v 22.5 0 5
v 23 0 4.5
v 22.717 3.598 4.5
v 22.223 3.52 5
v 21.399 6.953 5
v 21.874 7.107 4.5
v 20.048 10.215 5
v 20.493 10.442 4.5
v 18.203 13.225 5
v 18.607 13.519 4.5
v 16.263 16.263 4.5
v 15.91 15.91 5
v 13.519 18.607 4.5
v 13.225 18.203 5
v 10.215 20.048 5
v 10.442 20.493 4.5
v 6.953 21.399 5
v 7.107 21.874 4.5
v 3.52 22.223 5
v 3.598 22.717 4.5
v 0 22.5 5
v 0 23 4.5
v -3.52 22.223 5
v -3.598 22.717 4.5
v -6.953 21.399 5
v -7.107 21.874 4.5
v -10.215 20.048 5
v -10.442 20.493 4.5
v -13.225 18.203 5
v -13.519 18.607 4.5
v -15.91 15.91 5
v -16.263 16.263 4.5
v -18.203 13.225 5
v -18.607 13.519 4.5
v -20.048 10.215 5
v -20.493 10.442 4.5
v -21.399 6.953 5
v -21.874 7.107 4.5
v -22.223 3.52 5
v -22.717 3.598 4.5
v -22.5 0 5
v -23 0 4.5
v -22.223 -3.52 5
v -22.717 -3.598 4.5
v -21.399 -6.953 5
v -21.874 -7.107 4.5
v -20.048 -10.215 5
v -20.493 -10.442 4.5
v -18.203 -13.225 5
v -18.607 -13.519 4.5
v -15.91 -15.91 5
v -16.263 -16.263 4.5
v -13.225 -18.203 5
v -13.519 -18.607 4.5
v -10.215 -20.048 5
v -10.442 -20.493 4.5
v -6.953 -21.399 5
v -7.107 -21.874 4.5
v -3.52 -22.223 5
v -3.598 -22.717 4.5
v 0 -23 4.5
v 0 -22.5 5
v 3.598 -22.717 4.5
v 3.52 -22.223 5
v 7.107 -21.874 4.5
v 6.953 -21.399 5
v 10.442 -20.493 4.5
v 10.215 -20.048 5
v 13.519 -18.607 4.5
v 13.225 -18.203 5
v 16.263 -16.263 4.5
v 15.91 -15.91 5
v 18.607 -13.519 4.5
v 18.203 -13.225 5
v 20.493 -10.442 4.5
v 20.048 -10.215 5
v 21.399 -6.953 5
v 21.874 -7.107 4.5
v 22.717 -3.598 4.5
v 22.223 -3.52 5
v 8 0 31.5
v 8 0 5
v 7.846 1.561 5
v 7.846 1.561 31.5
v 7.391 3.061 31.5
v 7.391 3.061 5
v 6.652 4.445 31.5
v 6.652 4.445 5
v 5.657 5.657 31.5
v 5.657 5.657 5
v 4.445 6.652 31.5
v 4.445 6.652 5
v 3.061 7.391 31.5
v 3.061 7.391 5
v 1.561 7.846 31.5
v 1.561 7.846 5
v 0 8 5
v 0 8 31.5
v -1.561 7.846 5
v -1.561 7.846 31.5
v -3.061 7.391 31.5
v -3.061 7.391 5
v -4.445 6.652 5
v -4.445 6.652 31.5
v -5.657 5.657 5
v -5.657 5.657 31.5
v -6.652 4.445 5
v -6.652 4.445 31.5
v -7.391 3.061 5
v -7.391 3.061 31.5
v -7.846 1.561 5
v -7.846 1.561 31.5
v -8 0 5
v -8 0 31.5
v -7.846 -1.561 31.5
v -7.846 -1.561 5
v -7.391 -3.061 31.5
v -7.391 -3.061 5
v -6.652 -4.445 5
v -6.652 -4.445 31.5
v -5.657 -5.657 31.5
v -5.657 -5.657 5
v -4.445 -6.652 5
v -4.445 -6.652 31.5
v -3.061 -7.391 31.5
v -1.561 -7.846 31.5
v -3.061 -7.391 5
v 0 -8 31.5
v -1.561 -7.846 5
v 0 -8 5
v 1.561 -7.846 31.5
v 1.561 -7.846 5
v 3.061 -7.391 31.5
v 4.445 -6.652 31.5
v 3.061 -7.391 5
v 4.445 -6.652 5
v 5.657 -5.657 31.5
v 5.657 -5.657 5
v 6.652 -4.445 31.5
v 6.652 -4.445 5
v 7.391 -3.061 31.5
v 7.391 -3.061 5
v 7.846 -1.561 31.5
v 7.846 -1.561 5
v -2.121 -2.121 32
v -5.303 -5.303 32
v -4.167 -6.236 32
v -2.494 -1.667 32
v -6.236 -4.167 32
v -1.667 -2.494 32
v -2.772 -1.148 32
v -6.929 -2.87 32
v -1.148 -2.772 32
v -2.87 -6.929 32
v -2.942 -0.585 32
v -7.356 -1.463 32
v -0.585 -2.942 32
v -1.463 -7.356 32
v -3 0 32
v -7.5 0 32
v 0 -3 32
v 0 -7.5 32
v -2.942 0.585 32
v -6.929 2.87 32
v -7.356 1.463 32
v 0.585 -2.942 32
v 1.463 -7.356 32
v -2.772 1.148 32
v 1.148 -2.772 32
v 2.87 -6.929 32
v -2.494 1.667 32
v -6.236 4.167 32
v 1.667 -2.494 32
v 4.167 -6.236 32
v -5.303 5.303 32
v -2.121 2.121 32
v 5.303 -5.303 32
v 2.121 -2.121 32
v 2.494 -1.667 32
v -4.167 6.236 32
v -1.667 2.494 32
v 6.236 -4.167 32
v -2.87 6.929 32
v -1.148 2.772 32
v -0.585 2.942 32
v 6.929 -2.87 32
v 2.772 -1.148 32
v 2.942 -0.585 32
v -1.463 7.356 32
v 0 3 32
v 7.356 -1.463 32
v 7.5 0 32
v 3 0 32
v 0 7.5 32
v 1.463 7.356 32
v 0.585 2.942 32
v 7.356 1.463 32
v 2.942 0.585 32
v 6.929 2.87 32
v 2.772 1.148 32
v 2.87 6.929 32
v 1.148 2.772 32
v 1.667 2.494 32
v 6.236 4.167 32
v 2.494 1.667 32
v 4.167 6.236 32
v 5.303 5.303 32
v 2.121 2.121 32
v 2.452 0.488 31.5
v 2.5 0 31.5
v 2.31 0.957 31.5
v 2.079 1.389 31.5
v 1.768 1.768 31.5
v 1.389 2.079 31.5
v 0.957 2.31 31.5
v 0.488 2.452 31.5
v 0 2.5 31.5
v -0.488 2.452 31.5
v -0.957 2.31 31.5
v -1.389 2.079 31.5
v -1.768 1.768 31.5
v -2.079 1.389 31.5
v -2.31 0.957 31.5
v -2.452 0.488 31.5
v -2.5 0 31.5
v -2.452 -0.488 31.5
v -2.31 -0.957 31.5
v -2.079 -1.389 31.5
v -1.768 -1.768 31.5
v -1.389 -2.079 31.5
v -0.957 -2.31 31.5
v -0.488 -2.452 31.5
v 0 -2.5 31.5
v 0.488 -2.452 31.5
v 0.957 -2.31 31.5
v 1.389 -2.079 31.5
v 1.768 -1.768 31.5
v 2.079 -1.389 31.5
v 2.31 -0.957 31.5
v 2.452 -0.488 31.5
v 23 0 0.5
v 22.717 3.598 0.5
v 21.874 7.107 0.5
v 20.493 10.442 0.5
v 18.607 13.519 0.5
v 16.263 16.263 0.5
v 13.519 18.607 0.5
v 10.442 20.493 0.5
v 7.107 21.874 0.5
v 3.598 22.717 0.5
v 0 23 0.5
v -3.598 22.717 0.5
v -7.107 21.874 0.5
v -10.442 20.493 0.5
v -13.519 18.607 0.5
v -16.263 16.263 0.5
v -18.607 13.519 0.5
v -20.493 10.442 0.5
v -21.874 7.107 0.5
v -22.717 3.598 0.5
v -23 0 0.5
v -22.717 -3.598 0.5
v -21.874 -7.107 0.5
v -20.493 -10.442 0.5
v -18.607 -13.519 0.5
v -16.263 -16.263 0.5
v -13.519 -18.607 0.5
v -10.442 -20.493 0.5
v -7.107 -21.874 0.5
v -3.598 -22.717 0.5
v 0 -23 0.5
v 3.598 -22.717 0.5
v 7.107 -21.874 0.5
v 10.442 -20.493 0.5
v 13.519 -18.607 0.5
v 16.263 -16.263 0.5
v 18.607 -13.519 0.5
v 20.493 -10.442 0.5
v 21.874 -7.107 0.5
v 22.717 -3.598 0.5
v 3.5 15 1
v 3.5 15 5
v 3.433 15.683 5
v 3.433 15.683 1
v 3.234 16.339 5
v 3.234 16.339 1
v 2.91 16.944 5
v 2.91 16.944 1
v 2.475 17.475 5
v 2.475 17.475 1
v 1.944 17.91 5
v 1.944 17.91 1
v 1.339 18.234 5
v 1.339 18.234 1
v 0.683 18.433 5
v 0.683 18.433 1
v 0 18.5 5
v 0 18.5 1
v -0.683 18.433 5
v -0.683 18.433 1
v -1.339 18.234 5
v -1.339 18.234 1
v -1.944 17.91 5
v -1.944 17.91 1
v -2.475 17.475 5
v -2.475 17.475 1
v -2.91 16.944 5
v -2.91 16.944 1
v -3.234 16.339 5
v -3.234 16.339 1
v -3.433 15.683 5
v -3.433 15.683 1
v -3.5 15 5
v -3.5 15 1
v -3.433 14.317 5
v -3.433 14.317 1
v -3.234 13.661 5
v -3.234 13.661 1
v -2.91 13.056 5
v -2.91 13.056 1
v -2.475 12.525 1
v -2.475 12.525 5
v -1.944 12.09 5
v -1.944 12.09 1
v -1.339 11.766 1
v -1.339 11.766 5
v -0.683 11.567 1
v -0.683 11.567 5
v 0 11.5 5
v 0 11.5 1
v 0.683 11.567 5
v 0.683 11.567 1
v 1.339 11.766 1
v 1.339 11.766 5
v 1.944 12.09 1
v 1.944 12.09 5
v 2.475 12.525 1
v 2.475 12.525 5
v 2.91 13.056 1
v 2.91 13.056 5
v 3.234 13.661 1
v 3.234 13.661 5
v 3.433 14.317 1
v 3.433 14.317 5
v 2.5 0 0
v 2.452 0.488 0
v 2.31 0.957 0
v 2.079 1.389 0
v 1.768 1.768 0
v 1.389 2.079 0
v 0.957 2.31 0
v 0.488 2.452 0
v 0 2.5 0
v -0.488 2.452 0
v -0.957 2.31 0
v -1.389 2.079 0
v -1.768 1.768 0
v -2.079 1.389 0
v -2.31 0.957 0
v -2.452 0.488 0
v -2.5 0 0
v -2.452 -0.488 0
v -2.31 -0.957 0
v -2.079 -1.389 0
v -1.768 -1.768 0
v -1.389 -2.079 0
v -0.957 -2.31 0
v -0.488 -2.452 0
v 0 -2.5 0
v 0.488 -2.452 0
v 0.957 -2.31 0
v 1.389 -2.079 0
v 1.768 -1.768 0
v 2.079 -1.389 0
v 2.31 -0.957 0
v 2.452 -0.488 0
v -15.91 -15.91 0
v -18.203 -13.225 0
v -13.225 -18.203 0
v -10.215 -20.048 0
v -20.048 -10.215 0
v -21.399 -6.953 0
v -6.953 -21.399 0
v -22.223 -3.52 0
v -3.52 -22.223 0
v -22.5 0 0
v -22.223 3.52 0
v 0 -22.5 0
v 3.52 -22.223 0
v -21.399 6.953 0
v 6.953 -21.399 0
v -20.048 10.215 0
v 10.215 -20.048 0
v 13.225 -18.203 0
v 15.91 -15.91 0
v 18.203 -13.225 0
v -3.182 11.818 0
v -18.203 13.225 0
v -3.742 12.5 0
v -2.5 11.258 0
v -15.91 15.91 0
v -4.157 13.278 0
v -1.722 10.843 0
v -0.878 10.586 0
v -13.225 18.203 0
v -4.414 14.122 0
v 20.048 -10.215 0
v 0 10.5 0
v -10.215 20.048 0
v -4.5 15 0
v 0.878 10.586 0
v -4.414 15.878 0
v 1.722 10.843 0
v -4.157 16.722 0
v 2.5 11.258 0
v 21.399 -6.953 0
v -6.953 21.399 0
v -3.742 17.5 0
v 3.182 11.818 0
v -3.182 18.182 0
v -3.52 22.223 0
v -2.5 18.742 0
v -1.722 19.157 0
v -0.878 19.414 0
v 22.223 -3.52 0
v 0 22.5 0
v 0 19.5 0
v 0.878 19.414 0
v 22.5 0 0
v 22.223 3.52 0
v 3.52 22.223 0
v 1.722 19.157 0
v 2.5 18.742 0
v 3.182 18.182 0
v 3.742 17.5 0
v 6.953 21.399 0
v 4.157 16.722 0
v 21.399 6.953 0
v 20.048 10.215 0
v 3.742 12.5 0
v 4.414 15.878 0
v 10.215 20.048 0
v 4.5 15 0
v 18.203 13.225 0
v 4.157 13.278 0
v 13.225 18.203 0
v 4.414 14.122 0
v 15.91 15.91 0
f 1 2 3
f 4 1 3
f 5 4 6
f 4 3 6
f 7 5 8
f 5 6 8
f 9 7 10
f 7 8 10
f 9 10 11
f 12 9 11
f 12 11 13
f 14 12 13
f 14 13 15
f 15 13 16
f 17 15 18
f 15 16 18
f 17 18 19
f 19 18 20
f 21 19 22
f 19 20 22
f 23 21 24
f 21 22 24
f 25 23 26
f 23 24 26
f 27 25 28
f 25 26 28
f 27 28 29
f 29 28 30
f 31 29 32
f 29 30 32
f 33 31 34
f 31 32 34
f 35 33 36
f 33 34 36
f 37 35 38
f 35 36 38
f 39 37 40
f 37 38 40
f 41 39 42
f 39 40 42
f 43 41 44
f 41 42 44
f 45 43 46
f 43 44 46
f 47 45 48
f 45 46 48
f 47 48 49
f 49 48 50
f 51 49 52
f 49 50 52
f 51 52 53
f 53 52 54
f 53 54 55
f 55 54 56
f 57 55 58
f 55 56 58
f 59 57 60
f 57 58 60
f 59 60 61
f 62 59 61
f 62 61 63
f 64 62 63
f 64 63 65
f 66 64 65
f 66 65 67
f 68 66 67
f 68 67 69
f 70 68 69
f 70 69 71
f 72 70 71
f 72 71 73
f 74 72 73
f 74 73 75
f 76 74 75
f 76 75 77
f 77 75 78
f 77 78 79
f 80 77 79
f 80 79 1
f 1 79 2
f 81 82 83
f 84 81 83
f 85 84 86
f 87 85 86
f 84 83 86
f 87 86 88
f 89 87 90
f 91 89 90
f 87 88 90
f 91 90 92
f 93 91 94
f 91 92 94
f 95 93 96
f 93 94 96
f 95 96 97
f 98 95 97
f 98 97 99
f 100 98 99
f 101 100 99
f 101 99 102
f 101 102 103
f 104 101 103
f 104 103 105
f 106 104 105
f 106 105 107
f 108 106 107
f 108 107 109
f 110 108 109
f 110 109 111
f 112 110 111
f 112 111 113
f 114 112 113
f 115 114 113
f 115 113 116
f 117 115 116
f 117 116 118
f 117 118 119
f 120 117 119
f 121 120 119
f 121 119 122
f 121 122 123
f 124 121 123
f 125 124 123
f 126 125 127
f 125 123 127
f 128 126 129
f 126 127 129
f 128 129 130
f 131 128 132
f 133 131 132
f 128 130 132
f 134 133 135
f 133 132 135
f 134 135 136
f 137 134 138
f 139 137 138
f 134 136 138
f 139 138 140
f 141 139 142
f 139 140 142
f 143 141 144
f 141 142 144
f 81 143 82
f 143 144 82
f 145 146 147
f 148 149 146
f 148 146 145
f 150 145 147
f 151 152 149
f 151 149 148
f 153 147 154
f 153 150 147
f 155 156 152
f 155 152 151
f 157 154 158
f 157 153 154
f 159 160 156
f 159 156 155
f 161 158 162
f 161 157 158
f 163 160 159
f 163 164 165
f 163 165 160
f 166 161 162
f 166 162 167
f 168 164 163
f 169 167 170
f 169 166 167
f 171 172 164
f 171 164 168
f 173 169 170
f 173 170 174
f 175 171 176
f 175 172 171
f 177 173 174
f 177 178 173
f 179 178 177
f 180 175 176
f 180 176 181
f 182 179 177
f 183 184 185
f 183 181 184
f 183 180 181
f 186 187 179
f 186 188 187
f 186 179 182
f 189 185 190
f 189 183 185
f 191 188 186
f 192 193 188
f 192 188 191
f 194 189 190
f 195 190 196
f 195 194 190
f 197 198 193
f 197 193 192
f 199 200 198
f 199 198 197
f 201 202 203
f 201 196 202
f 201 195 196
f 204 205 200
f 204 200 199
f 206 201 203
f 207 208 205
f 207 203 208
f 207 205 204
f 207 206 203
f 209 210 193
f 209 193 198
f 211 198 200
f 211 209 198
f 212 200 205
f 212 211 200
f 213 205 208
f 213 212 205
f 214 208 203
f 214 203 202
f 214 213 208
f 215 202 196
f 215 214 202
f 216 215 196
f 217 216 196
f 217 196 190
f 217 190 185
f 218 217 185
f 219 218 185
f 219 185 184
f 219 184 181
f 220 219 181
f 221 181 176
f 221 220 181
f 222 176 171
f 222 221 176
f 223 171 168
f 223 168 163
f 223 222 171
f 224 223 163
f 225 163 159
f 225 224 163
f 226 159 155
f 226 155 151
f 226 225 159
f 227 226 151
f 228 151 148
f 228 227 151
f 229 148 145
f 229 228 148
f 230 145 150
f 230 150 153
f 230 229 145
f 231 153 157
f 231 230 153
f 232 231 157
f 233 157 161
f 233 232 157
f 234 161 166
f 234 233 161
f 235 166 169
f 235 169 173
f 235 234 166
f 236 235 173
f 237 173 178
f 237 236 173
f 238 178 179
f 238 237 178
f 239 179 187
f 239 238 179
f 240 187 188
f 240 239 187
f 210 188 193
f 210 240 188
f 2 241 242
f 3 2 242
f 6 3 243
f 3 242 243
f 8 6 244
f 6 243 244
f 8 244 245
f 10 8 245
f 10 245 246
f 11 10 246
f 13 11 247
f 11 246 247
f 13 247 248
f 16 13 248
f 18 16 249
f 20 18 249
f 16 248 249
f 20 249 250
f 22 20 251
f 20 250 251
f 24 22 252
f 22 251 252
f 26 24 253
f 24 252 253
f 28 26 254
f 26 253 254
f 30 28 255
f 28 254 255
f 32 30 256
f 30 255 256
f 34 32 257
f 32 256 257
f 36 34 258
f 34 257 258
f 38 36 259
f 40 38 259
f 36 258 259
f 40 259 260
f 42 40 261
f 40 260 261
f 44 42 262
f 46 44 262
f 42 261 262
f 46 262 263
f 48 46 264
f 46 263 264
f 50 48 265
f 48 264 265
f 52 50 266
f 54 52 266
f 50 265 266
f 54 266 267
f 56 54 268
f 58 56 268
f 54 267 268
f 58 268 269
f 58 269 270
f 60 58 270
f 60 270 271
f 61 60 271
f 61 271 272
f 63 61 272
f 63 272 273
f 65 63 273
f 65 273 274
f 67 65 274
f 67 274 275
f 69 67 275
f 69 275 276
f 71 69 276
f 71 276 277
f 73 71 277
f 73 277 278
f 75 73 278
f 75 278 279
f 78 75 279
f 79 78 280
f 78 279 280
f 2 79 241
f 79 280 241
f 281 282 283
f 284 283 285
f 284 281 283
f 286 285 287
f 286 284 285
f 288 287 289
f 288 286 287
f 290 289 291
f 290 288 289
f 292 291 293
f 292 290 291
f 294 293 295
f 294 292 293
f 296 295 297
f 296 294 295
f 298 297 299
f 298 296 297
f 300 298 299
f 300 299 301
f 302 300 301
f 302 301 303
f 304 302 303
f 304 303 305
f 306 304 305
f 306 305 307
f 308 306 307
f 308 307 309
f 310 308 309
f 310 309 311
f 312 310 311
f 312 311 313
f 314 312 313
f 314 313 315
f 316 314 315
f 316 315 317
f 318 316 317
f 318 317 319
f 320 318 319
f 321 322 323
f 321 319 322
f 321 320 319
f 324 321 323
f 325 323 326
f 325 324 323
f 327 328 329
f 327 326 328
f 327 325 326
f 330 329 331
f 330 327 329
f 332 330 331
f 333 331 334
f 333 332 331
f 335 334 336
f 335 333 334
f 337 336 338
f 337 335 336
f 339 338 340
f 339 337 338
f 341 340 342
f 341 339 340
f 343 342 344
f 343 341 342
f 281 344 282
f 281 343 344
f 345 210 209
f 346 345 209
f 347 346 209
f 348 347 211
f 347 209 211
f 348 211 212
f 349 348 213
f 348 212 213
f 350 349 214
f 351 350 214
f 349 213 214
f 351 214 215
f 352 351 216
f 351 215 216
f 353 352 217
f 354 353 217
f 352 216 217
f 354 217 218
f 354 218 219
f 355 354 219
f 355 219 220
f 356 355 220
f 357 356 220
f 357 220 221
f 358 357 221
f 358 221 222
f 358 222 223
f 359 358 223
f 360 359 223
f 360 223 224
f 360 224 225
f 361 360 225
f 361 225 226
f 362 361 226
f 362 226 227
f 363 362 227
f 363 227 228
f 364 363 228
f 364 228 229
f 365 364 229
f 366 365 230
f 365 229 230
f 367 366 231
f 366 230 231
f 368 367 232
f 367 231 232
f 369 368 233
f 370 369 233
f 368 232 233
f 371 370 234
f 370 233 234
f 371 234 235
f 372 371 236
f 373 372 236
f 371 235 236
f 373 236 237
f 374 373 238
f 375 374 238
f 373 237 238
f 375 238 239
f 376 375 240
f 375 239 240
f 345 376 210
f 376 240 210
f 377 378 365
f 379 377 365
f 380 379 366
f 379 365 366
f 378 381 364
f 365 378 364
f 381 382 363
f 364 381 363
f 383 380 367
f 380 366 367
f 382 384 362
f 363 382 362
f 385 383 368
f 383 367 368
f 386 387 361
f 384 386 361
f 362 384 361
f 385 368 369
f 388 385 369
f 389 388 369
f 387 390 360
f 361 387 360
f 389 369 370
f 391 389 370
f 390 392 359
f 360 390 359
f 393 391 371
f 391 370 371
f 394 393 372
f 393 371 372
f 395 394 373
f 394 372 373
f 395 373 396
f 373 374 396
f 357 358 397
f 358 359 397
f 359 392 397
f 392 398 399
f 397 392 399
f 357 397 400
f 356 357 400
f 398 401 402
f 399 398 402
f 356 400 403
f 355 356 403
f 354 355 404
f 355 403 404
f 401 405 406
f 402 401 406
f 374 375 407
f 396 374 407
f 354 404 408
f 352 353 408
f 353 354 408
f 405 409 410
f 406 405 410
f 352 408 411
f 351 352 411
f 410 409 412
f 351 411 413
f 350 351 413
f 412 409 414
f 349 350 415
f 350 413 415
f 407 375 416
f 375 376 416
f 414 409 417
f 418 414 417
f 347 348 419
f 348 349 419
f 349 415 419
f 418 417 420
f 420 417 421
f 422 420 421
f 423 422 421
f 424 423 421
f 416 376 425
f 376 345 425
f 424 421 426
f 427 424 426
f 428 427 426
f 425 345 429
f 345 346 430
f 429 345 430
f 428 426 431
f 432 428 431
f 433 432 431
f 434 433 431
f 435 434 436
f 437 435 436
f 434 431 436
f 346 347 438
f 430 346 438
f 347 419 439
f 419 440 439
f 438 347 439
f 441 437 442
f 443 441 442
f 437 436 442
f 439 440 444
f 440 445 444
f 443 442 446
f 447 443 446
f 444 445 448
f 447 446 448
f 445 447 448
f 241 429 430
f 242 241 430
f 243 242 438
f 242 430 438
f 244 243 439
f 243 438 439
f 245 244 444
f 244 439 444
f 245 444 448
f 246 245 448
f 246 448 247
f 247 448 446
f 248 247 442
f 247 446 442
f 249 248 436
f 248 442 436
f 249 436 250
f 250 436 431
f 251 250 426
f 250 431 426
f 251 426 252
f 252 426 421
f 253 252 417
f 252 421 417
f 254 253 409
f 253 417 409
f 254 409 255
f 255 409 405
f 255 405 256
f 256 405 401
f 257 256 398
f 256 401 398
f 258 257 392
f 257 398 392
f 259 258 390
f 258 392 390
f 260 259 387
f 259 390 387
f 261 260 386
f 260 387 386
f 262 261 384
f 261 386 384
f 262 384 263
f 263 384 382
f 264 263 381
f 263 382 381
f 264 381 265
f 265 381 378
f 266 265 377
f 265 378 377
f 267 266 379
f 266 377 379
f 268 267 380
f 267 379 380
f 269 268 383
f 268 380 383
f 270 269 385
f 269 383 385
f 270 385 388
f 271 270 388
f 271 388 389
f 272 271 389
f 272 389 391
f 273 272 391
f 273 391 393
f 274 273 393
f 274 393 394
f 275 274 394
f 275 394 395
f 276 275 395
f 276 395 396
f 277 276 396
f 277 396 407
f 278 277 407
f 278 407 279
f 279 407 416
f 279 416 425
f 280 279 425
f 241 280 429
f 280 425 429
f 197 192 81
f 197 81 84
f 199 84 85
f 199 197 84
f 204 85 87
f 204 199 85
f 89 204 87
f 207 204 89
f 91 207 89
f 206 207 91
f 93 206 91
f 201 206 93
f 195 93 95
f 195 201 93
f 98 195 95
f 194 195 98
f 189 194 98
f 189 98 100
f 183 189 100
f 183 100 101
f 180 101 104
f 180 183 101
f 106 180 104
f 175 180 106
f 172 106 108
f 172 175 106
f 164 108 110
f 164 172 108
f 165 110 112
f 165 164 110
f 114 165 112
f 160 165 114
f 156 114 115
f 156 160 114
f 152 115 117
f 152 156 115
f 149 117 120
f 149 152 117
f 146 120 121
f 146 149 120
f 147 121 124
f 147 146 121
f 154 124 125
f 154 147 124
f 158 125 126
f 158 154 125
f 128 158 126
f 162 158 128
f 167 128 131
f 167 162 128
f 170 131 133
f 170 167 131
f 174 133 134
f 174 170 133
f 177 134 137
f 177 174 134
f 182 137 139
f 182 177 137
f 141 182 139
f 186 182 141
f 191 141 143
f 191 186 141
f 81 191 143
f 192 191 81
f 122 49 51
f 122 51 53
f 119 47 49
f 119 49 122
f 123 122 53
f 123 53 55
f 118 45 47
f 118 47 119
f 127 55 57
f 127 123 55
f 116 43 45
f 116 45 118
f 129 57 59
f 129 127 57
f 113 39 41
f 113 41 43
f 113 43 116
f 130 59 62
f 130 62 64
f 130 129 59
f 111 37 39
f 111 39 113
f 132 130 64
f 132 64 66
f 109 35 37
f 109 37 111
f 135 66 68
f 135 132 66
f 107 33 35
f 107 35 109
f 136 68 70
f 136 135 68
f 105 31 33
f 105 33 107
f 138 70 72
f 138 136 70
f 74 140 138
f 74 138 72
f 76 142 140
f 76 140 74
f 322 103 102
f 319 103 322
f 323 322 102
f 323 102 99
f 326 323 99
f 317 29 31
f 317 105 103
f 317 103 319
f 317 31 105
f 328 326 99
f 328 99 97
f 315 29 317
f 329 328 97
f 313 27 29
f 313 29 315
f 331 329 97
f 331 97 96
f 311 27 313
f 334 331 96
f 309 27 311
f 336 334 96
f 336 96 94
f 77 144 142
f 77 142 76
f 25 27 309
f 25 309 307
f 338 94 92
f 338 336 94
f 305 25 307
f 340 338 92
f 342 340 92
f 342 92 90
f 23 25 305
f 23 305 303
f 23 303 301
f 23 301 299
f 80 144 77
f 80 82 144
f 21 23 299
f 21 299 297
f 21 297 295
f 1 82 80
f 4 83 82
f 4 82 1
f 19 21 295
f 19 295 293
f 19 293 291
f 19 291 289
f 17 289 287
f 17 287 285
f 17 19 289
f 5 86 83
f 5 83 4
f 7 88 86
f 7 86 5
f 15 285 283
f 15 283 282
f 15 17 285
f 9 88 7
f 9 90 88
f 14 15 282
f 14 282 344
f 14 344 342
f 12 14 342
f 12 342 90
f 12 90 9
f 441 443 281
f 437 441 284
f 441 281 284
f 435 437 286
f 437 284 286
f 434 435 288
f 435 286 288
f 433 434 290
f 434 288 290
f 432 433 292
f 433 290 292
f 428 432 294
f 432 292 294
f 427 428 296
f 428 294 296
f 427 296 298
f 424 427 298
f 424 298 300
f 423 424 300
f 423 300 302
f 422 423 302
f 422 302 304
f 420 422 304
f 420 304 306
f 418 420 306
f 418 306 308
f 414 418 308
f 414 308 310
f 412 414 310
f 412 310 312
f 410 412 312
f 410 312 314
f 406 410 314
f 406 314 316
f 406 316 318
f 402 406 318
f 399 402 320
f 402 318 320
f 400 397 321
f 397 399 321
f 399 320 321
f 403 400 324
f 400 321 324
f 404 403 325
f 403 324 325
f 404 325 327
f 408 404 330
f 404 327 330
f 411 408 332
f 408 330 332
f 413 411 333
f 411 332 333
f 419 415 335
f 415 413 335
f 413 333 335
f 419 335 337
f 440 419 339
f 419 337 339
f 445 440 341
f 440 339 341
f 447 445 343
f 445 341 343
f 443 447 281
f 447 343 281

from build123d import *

# Parameters (mm, degrees)
SKETCH1_R                                           = 23
SKETCH1_R_2                                         = 8
SKETCH1_R_3                                         = 3.5
BOSS_EXTRUDE1_DEPTH                                 = 5
SKETCH1_3_R                                         = 8
BOSS_EXTRUDE2_DEPTH                                 = 32
SKETCH2_R                                           = 2.5
CUT_EXTRUDE1_DEPTH                                  = 37
CHAMFER2_SIZE                                       = 0.5
CSK_FOR_M6_COUNTERSUNK_FLAT_HEAD_SCREW2_D           = 7
CSK_FOR_M6_COUNTERSUNK_FLAT_HEAD_SCREW2_DEPTH       = 5
CSK_FOR_M6_COUNTERSUNK_FLAT_HEAD_SCREW2_CSINK_D     = 9
CSK_FOR_M6_COUNTERSUNK_FLAT_HEAD_SCREW2_CSINK_ANGLE = 90
CSK_FOR_M6_COUNTERSUNK_FLAT_HEAD_SCREW2_TIP         = 2.103012167


with BuildPart() as part:
    # Sketch1 → Boss-Extrude1 (new body)
    with BuildSketch(Plane.XY):
        Circle(SKETCH1_R)
        Circle(SKETCH1_R_2, mode=Mode.SUBTRACT)
        with Locations((0, 15)):
            Circle(SKETCH1_R_3, mode=Mode.SUBTRACT)
    extrude(amount=BOSS_EXTRUDE1_DEPTH)

    # Sketch1<3> → Boss-Extrude2 (add)
    with BuildSketch(Plane.XY):
        Circle(SKETCH1_3_R)
    extrude(amount=BOSS_EXTRUDE2_DEPTH)

    # Sketch2 → Cut-Extrude1 (cut)
    with BuildSketch(Plane.XY.offset(32)):
        Circle(SKETCH2_R)
    extrude(amount=-CUT_EXTRUDE1_DEPTH, mode=Mode.SUBTRACT)

    # Chamfer2
    chamfer2_edges = [part.edges().sort_by_distance(p)[0] for p in [
        (-8, 0, 32),
        (-23, 0, 0),
        (-2.5, 0, 32),
        (-23, 0, 5),
    ]]
    chamfer(chamfer2_edges, length=CHAMFER2_SIZE)

    # CSK for M6 Countersunk Flat Head Screw2
    with Locations(Plane(origin=(0, 0, 0), x_dir=(-1, 0, 0), z_dir=(0, 0, -1))):
        with Locations((0, 15)):
            CounterSinkHole(CSK_FOR_M6_COUNTERSUNK_FLAT_HEAD_SCREW2_D / 2, CSK_FOR_M6_COUNTERSUNK_FLAT_HEAD_SCREW2_CSINK_D / 2, depth=CSK_FOR_M6_COUNTERSUNK_FLAT_HEAD_SCREW2_DEPTH, counter_sink_angle=CSK_FOR_M6_COUNTERSUNK_FLAT_HEAD_SCREW2_CSINK_ANGLE)
            with Locations((0, 0, -(CSK_FOR_M6_COUNTERSUNK_FLAT_HEAD_SCREW2_DEPTH + CSK_FOR_M6_COUNTERSUNK_FLAT_HEAD_SCREW2_TIP / 2))):  # 118° drill point
                Cone(0, CSK_FOR_M6_COUNTERSUNK_FLAT_HEAD_SCREW2_D / 2, CSK_FOR_M6_COUNTERSUNK_FLAT_HEAD_SCREW2_TIP, mode=Mode.SUBTRACT)


solid = part.part
